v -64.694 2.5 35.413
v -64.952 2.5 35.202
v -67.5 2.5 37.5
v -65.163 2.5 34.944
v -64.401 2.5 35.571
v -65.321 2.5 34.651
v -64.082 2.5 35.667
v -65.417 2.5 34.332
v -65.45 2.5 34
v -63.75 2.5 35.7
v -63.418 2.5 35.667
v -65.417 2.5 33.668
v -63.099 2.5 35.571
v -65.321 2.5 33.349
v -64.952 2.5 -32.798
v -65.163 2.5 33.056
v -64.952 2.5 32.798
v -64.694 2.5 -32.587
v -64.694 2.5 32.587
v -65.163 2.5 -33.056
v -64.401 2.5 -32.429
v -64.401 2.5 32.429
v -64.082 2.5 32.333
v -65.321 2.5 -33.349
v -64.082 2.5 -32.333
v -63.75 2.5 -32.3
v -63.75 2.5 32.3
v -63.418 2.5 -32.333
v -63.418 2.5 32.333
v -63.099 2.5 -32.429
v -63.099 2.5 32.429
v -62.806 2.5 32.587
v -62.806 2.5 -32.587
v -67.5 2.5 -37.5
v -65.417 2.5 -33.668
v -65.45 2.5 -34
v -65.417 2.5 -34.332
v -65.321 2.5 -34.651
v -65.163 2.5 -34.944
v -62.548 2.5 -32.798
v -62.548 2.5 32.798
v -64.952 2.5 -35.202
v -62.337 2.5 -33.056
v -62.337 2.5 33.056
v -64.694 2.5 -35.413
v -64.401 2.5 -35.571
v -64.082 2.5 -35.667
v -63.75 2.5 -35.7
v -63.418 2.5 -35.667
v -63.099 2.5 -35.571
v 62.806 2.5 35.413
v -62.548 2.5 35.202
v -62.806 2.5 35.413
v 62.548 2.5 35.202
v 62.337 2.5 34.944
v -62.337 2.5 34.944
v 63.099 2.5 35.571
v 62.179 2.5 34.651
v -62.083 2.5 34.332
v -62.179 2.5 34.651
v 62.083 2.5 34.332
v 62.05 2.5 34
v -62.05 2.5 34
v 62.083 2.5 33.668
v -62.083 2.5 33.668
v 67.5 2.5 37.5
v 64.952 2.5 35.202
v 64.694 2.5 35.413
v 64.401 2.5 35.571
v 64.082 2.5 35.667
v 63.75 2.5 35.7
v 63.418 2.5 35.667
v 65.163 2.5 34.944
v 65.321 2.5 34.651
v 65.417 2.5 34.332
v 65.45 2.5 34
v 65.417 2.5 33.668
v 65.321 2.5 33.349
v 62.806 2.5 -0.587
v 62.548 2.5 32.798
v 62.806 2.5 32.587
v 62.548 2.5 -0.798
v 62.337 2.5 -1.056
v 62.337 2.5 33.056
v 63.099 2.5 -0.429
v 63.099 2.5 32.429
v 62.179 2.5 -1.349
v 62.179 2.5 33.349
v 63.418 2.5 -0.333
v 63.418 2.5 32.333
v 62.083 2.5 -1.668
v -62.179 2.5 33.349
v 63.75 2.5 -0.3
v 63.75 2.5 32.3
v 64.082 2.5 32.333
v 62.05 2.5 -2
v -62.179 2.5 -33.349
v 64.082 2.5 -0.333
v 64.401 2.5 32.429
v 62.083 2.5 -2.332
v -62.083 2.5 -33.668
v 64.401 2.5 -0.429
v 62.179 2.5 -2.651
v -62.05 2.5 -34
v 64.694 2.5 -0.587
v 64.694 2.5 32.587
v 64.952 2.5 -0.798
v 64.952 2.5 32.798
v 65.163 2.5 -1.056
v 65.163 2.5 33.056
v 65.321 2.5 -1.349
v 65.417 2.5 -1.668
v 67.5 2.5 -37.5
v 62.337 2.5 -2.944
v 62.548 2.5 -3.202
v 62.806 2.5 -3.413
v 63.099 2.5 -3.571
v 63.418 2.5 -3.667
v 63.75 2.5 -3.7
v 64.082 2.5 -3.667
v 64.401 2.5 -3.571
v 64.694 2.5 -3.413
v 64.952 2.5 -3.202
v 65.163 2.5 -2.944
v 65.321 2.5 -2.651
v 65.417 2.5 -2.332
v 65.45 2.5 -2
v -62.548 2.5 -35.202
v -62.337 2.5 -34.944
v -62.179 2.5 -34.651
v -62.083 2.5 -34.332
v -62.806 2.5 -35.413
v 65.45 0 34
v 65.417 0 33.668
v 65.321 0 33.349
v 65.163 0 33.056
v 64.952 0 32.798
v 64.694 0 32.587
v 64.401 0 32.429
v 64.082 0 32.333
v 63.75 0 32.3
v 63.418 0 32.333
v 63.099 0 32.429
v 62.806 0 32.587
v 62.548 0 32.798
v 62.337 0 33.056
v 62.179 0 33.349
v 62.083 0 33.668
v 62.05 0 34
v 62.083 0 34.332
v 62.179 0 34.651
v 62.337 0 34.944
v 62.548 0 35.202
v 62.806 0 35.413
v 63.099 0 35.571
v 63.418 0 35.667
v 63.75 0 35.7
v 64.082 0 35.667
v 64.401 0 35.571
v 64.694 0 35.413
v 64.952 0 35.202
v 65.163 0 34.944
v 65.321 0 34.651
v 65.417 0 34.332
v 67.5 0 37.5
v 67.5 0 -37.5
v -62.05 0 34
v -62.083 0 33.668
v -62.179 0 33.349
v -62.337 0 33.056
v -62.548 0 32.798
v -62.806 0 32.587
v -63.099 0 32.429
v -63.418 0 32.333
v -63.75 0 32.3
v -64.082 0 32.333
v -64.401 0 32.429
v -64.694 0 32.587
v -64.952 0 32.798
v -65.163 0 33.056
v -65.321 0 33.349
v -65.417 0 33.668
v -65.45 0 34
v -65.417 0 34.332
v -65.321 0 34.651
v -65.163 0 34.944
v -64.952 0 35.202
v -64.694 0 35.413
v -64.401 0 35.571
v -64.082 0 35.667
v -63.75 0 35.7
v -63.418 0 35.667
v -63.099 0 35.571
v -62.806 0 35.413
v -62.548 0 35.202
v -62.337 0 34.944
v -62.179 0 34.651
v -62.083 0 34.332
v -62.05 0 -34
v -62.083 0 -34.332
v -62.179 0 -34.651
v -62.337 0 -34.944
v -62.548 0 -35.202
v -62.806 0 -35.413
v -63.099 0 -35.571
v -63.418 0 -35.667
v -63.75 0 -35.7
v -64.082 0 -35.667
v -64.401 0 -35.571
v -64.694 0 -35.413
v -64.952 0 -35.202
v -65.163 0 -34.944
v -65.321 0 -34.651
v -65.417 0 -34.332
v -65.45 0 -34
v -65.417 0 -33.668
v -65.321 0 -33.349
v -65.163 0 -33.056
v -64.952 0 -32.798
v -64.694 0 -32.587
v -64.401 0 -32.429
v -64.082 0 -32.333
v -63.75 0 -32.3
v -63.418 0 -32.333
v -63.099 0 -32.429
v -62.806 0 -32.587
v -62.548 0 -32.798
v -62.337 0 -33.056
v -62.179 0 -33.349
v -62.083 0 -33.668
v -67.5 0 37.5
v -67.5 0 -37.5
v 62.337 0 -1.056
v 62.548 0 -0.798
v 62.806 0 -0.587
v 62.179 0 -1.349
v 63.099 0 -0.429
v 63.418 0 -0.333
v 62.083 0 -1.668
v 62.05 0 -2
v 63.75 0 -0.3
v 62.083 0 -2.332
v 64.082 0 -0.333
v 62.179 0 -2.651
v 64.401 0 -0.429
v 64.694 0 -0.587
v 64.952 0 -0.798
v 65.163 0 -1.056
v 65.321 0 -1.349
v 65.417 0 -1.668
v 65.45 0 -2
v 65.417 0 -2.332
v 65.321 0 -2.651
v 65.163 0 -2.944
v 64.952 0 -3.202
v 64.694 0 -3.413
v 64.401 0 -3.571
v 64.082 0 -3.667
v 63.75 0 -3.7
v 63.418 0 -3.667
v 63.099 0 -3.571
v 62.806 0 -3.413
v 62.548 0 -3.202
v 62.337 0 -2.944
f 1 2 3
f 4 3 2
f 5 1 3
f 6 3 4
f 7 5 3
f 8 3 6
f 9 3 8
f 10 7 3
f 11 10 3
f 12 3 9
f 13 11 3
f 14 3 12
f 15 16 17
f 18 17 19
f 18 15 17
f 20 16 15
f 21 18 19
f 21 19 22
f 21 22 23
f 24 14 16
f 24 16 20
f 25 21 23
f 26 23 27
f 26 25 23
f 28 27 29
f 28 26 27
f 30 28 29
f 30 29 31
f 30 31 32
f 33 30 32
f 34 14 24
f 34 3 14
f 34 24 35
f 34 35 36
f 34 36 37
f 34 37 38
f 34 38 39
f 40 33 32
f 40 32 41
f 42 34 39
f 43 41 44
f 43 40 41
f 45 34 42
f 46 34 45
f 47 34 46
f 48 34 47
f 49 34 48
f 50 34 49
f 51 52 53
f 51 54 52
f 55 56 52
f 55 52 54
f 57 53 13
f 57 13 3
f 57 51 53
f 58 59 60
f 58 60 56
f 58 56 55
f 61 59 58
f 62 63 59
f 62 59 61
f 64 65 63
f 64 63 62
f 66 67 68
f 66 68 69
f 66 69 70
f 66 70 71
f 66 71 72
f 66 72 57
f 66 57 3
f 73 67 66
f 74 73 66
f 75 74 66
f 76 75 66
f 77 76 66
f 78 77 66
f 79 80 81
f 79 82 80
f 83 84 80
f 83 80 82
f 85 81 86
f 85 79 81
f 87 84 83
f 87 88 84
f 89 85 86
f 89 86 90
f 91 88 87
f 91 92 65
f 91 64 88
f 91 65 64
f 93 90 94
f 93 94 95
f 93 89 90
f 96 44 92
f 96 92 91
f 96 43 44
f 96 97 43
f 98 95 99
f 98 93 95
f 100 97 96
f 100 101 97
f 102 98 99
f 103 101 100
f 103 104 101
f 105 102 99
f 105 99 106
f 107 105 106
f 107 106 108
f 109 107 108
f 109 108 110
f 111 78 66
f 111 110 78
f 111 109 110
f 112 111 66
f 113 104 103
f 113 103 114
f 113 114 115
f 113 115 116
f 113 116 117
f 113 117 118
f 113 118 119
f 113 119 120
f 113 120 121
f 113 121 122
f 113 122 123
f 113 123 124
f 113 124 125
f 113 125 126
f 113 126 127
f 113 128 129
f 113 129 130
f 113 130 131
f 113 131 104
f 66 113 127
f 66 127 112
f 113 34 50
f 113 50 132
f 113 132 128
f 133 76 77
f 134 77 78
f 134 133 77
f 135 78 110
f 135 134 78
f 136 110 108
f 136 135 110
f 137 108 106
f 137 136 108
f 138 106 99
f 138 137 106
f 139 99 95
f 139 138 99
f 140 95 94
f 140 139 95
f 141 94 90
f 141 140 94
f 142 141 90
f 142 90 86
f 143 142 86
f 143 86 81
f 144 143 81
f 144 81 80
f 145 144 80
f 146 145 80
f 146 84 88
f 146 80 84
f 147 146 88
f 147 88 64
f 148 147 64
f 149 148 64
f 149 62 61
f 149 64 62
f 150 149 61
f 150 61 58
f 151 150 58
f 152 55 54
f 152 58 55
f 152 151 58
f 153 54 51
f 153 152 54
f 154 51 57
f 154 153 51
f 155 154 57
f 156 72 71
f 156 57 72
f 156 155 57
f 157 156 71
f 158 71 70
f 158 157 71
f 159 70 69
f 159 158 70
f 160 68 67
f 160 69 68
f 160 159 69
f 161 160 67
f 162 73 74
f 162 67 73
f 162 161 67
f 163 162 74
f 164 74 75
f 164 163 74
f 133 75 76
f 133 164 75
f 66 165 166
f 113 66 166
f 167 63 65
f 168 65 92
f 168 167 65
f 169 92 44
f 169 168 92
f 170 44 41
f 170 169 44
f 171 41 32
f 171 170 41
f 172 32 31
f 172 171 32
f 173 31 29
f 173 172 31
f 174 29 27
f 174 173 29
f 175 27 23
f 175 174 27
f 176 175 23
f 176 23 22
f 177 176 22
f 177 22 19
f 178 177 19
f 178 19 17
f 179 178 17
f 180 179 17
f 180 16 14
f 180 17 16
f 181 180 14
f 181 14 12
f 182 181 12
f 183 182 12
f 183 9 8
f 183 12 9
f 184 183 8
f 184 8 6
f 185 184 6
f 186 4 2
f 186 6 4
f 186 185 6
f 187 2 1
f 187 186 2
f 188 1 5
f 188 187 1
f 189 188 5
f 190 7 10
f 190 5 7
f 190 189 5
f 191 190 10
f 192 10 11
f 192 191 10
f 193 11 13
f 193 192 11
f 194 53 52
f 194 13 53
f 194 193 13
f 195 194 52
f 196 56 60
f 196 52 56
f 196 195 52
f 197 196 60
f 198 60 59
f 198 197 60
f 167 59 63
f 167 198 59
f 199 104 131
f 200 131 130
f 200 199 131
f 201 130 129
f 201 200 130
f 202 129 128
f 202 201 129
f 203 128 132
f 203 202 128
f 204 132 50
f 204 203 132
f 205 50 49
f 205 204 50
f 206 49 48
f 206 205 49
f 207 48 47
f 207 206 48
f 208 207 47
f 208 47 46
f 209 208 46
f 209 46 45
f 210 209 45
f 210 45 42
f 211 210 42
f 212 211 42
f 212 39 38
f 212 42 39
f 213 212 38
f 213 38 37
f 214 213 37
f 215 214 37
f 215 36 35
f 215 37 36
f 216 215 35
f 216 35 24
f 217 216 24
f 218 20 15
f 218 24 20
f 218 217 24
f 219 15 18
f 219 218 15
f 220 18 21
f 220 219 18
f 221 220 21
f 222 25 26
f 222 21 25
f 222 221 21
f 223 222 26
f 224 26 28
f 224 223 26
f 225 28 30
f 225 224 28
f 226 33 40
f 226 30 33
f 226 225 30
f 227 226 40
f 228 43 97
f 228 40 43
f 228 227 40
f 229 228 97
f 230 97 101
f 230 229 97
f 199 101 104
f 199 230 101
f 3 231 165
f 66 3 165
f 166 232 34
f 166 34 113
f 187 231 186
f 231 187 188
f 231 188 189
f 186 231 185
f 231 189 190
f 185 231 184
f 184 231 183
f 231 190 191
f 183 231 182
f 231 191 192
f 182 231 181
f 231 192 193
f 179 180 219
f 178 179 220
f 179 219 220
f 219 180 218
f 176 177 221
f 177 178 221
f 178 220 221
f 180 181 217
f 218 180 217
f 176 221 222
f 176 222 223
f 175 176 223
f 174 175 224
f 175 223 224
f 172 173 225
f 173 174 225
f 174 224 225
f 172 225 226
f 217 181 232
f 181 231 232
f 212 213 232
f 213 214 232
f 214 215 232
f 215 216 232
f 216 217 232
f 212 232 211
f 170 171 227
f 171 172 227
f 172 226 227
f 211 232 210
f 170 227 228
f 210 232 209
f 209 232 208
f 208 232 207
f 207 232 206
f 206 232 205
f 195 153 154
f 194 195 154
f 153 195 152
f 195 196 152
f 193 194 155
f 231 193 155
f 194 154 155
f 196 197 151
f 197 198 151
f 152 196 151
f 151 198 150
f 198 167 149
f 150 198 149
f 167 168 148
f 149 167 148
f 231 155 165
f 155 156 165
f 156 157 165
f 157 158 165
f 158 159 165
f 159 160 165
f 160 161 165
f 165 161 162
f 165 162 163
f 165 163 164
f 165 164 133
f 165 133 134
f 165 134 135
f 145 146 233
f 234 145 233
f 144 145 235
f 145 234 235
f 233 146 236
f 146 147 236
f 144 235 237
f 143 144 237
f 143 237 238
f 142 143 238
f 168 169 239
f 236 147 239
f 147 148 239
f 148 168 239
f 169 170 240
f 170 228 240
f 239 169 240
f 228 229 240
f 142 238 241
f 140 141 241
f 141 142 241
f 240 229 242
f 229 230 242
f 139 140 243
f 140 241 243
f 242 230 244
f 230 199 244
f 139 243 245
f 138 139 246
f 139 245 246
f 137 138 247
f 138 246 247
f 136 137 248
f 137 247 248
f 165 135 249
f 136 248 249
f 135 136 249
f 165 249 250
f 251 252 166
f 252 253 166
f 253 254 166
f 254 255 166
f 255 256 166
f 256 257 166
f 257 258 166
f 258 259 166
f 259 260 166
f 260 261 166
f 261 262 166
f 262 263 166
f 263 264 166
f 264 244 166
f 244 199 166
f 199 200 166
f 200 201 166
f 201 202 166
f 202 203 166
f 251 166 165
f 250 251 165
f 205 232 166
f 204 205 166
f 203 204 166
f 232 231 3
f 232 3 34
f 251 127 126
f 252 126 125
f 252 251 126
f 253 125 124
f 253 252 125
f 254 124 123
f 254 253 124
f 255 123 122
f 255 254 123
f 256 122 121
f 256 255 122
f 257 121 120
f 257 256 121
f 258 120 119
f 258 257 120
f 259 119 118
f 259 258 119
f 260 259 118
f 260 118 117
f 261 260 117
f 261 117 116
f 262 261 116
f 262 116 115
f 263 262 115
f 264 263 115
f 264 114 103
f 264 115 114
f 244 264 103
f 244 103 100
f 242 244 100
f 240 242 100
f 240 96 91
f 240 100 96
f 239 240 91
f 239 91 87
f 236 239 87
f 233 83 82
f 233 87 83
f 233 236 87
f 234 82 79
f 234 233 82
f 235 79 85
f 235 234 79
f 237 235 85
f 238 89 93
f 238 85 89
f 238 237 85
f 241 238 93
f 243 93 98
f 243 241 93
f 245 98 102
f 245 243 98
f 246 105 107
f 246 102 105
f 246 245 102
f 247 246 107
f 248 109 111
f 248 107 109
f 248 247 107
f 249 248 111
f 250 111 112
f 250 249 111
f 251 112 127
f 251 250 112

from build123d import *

# Parameters (mm, degrees)
SKETCH1_W           = 135
SKETCH1_H           = 75
BOSS_EXTRUDE1_DEPTH = 2.5
CUT_EXTRUDE1_REACH  = 4.5
SKETCH2_R           = 1.7


with BuildPart() as part:
    # Sketch1 → Boss-Extrude1 (new body)
    with BuildSketch(Plane(origin=(0, 0, 0), x_dir=(1, 0, 0), z_dir=(0, 1, 0))):
        Rectangle(SKETCH1_W, SKETCH1_H)
    extrude(amount=BOSS_EXTRUDE1_DEPTH)

    # Sketch2 → Cut-Extrude1 (cut, up to next)
    with BuildSketch(Plane(origin=(0, 0, 0), x_dir=(1, 0, 0), z_dir=(0, 1, 0)), mode=Mode.PRIVATE) as cut_extrude1_sk1:
        with Locations((63.75, -34)):
            Circle(SKETCH2_R)
    cut_extrude1_tool1 = extrude(cut_extrude1_sk1.sketch, amount=CUT_EXTRUDE1_REACH, mode=Mode.PRIVATE) & part.part
    add(cut_extrude1_tool1.solids().sort_by_distance((63.75, 0, 34))[0], mode=Mode.SUBTRACT)
    # Sketch2 → Cut-Extrude1 (cut, up to next)
    with BuildSketch(Plane(origin=(0, 0, 0), x_dir=(1, 0, 0), z_dir=(0, 1, 0)), mode=Mode.PRIVATE) as cut_extrude1_sk2:
        with Locations((63.75, 2)):
            Circle(SKETCH2_R)
    cut_extrude1_tool2 = extrude(cut_extrude1_sk2.sketch, amount=CUT_EXTRUDE1_REACH, mode=Mode.PRIVATE) & part.part
    add(cut_extrude1_tool2.solids().sort_by_distance((63.75, 0, -2))[0], mode=Mode.SUBTRACT)
    # Sketch2 → Cut-Extrude1 (cut, up to next)
    with BuildSketch(Plane(origin=(0, 0, 0), x_dir=(1, 0, 0), z_dir=(0, 1, 0)), mode=Mode.PRIVATE) as cut_extrude1_sk3:
        with Locations((-63.75, -34)):
            Circle(SKETCH2_R)
    cut_extrude1_tool3 = extrude(cut_extrude1_sk3.sketch, amount=CUT_EXTRUDE1_REACH, mode=Mode.PRIVATE) & part.part
    add(cut_extrude1_tool3.solids().sort_by_distance((-63.75, 0, 34))[0], mode=Mode.SUBTRACT)
    # Sketch2 → Cut-Extrude1 (cut, up to next)
    with BuildSketch(Plane(origin=(0, 0, 0), x_dir=(1, 0, 0), z_dir=(0, 1, 0)), mode=Mode.PRIVATE) as cut_extrude1_sk4:
        with Locations((-63.75, 34)):
            Circle(SKETCH2_R)
    cut_extrude1_tool4 = extrude(cut_extrude1_sk4.sketch, amount=CUT_EXTRUDE1_REACH, mode=Mode.PRIVATE) & part.part
    add(cut_extrude1_tool4.solids().sort_by_distance((-63.75, 0, -34))[0], mode=Mode.SUBTRACT)


solid = part.part
